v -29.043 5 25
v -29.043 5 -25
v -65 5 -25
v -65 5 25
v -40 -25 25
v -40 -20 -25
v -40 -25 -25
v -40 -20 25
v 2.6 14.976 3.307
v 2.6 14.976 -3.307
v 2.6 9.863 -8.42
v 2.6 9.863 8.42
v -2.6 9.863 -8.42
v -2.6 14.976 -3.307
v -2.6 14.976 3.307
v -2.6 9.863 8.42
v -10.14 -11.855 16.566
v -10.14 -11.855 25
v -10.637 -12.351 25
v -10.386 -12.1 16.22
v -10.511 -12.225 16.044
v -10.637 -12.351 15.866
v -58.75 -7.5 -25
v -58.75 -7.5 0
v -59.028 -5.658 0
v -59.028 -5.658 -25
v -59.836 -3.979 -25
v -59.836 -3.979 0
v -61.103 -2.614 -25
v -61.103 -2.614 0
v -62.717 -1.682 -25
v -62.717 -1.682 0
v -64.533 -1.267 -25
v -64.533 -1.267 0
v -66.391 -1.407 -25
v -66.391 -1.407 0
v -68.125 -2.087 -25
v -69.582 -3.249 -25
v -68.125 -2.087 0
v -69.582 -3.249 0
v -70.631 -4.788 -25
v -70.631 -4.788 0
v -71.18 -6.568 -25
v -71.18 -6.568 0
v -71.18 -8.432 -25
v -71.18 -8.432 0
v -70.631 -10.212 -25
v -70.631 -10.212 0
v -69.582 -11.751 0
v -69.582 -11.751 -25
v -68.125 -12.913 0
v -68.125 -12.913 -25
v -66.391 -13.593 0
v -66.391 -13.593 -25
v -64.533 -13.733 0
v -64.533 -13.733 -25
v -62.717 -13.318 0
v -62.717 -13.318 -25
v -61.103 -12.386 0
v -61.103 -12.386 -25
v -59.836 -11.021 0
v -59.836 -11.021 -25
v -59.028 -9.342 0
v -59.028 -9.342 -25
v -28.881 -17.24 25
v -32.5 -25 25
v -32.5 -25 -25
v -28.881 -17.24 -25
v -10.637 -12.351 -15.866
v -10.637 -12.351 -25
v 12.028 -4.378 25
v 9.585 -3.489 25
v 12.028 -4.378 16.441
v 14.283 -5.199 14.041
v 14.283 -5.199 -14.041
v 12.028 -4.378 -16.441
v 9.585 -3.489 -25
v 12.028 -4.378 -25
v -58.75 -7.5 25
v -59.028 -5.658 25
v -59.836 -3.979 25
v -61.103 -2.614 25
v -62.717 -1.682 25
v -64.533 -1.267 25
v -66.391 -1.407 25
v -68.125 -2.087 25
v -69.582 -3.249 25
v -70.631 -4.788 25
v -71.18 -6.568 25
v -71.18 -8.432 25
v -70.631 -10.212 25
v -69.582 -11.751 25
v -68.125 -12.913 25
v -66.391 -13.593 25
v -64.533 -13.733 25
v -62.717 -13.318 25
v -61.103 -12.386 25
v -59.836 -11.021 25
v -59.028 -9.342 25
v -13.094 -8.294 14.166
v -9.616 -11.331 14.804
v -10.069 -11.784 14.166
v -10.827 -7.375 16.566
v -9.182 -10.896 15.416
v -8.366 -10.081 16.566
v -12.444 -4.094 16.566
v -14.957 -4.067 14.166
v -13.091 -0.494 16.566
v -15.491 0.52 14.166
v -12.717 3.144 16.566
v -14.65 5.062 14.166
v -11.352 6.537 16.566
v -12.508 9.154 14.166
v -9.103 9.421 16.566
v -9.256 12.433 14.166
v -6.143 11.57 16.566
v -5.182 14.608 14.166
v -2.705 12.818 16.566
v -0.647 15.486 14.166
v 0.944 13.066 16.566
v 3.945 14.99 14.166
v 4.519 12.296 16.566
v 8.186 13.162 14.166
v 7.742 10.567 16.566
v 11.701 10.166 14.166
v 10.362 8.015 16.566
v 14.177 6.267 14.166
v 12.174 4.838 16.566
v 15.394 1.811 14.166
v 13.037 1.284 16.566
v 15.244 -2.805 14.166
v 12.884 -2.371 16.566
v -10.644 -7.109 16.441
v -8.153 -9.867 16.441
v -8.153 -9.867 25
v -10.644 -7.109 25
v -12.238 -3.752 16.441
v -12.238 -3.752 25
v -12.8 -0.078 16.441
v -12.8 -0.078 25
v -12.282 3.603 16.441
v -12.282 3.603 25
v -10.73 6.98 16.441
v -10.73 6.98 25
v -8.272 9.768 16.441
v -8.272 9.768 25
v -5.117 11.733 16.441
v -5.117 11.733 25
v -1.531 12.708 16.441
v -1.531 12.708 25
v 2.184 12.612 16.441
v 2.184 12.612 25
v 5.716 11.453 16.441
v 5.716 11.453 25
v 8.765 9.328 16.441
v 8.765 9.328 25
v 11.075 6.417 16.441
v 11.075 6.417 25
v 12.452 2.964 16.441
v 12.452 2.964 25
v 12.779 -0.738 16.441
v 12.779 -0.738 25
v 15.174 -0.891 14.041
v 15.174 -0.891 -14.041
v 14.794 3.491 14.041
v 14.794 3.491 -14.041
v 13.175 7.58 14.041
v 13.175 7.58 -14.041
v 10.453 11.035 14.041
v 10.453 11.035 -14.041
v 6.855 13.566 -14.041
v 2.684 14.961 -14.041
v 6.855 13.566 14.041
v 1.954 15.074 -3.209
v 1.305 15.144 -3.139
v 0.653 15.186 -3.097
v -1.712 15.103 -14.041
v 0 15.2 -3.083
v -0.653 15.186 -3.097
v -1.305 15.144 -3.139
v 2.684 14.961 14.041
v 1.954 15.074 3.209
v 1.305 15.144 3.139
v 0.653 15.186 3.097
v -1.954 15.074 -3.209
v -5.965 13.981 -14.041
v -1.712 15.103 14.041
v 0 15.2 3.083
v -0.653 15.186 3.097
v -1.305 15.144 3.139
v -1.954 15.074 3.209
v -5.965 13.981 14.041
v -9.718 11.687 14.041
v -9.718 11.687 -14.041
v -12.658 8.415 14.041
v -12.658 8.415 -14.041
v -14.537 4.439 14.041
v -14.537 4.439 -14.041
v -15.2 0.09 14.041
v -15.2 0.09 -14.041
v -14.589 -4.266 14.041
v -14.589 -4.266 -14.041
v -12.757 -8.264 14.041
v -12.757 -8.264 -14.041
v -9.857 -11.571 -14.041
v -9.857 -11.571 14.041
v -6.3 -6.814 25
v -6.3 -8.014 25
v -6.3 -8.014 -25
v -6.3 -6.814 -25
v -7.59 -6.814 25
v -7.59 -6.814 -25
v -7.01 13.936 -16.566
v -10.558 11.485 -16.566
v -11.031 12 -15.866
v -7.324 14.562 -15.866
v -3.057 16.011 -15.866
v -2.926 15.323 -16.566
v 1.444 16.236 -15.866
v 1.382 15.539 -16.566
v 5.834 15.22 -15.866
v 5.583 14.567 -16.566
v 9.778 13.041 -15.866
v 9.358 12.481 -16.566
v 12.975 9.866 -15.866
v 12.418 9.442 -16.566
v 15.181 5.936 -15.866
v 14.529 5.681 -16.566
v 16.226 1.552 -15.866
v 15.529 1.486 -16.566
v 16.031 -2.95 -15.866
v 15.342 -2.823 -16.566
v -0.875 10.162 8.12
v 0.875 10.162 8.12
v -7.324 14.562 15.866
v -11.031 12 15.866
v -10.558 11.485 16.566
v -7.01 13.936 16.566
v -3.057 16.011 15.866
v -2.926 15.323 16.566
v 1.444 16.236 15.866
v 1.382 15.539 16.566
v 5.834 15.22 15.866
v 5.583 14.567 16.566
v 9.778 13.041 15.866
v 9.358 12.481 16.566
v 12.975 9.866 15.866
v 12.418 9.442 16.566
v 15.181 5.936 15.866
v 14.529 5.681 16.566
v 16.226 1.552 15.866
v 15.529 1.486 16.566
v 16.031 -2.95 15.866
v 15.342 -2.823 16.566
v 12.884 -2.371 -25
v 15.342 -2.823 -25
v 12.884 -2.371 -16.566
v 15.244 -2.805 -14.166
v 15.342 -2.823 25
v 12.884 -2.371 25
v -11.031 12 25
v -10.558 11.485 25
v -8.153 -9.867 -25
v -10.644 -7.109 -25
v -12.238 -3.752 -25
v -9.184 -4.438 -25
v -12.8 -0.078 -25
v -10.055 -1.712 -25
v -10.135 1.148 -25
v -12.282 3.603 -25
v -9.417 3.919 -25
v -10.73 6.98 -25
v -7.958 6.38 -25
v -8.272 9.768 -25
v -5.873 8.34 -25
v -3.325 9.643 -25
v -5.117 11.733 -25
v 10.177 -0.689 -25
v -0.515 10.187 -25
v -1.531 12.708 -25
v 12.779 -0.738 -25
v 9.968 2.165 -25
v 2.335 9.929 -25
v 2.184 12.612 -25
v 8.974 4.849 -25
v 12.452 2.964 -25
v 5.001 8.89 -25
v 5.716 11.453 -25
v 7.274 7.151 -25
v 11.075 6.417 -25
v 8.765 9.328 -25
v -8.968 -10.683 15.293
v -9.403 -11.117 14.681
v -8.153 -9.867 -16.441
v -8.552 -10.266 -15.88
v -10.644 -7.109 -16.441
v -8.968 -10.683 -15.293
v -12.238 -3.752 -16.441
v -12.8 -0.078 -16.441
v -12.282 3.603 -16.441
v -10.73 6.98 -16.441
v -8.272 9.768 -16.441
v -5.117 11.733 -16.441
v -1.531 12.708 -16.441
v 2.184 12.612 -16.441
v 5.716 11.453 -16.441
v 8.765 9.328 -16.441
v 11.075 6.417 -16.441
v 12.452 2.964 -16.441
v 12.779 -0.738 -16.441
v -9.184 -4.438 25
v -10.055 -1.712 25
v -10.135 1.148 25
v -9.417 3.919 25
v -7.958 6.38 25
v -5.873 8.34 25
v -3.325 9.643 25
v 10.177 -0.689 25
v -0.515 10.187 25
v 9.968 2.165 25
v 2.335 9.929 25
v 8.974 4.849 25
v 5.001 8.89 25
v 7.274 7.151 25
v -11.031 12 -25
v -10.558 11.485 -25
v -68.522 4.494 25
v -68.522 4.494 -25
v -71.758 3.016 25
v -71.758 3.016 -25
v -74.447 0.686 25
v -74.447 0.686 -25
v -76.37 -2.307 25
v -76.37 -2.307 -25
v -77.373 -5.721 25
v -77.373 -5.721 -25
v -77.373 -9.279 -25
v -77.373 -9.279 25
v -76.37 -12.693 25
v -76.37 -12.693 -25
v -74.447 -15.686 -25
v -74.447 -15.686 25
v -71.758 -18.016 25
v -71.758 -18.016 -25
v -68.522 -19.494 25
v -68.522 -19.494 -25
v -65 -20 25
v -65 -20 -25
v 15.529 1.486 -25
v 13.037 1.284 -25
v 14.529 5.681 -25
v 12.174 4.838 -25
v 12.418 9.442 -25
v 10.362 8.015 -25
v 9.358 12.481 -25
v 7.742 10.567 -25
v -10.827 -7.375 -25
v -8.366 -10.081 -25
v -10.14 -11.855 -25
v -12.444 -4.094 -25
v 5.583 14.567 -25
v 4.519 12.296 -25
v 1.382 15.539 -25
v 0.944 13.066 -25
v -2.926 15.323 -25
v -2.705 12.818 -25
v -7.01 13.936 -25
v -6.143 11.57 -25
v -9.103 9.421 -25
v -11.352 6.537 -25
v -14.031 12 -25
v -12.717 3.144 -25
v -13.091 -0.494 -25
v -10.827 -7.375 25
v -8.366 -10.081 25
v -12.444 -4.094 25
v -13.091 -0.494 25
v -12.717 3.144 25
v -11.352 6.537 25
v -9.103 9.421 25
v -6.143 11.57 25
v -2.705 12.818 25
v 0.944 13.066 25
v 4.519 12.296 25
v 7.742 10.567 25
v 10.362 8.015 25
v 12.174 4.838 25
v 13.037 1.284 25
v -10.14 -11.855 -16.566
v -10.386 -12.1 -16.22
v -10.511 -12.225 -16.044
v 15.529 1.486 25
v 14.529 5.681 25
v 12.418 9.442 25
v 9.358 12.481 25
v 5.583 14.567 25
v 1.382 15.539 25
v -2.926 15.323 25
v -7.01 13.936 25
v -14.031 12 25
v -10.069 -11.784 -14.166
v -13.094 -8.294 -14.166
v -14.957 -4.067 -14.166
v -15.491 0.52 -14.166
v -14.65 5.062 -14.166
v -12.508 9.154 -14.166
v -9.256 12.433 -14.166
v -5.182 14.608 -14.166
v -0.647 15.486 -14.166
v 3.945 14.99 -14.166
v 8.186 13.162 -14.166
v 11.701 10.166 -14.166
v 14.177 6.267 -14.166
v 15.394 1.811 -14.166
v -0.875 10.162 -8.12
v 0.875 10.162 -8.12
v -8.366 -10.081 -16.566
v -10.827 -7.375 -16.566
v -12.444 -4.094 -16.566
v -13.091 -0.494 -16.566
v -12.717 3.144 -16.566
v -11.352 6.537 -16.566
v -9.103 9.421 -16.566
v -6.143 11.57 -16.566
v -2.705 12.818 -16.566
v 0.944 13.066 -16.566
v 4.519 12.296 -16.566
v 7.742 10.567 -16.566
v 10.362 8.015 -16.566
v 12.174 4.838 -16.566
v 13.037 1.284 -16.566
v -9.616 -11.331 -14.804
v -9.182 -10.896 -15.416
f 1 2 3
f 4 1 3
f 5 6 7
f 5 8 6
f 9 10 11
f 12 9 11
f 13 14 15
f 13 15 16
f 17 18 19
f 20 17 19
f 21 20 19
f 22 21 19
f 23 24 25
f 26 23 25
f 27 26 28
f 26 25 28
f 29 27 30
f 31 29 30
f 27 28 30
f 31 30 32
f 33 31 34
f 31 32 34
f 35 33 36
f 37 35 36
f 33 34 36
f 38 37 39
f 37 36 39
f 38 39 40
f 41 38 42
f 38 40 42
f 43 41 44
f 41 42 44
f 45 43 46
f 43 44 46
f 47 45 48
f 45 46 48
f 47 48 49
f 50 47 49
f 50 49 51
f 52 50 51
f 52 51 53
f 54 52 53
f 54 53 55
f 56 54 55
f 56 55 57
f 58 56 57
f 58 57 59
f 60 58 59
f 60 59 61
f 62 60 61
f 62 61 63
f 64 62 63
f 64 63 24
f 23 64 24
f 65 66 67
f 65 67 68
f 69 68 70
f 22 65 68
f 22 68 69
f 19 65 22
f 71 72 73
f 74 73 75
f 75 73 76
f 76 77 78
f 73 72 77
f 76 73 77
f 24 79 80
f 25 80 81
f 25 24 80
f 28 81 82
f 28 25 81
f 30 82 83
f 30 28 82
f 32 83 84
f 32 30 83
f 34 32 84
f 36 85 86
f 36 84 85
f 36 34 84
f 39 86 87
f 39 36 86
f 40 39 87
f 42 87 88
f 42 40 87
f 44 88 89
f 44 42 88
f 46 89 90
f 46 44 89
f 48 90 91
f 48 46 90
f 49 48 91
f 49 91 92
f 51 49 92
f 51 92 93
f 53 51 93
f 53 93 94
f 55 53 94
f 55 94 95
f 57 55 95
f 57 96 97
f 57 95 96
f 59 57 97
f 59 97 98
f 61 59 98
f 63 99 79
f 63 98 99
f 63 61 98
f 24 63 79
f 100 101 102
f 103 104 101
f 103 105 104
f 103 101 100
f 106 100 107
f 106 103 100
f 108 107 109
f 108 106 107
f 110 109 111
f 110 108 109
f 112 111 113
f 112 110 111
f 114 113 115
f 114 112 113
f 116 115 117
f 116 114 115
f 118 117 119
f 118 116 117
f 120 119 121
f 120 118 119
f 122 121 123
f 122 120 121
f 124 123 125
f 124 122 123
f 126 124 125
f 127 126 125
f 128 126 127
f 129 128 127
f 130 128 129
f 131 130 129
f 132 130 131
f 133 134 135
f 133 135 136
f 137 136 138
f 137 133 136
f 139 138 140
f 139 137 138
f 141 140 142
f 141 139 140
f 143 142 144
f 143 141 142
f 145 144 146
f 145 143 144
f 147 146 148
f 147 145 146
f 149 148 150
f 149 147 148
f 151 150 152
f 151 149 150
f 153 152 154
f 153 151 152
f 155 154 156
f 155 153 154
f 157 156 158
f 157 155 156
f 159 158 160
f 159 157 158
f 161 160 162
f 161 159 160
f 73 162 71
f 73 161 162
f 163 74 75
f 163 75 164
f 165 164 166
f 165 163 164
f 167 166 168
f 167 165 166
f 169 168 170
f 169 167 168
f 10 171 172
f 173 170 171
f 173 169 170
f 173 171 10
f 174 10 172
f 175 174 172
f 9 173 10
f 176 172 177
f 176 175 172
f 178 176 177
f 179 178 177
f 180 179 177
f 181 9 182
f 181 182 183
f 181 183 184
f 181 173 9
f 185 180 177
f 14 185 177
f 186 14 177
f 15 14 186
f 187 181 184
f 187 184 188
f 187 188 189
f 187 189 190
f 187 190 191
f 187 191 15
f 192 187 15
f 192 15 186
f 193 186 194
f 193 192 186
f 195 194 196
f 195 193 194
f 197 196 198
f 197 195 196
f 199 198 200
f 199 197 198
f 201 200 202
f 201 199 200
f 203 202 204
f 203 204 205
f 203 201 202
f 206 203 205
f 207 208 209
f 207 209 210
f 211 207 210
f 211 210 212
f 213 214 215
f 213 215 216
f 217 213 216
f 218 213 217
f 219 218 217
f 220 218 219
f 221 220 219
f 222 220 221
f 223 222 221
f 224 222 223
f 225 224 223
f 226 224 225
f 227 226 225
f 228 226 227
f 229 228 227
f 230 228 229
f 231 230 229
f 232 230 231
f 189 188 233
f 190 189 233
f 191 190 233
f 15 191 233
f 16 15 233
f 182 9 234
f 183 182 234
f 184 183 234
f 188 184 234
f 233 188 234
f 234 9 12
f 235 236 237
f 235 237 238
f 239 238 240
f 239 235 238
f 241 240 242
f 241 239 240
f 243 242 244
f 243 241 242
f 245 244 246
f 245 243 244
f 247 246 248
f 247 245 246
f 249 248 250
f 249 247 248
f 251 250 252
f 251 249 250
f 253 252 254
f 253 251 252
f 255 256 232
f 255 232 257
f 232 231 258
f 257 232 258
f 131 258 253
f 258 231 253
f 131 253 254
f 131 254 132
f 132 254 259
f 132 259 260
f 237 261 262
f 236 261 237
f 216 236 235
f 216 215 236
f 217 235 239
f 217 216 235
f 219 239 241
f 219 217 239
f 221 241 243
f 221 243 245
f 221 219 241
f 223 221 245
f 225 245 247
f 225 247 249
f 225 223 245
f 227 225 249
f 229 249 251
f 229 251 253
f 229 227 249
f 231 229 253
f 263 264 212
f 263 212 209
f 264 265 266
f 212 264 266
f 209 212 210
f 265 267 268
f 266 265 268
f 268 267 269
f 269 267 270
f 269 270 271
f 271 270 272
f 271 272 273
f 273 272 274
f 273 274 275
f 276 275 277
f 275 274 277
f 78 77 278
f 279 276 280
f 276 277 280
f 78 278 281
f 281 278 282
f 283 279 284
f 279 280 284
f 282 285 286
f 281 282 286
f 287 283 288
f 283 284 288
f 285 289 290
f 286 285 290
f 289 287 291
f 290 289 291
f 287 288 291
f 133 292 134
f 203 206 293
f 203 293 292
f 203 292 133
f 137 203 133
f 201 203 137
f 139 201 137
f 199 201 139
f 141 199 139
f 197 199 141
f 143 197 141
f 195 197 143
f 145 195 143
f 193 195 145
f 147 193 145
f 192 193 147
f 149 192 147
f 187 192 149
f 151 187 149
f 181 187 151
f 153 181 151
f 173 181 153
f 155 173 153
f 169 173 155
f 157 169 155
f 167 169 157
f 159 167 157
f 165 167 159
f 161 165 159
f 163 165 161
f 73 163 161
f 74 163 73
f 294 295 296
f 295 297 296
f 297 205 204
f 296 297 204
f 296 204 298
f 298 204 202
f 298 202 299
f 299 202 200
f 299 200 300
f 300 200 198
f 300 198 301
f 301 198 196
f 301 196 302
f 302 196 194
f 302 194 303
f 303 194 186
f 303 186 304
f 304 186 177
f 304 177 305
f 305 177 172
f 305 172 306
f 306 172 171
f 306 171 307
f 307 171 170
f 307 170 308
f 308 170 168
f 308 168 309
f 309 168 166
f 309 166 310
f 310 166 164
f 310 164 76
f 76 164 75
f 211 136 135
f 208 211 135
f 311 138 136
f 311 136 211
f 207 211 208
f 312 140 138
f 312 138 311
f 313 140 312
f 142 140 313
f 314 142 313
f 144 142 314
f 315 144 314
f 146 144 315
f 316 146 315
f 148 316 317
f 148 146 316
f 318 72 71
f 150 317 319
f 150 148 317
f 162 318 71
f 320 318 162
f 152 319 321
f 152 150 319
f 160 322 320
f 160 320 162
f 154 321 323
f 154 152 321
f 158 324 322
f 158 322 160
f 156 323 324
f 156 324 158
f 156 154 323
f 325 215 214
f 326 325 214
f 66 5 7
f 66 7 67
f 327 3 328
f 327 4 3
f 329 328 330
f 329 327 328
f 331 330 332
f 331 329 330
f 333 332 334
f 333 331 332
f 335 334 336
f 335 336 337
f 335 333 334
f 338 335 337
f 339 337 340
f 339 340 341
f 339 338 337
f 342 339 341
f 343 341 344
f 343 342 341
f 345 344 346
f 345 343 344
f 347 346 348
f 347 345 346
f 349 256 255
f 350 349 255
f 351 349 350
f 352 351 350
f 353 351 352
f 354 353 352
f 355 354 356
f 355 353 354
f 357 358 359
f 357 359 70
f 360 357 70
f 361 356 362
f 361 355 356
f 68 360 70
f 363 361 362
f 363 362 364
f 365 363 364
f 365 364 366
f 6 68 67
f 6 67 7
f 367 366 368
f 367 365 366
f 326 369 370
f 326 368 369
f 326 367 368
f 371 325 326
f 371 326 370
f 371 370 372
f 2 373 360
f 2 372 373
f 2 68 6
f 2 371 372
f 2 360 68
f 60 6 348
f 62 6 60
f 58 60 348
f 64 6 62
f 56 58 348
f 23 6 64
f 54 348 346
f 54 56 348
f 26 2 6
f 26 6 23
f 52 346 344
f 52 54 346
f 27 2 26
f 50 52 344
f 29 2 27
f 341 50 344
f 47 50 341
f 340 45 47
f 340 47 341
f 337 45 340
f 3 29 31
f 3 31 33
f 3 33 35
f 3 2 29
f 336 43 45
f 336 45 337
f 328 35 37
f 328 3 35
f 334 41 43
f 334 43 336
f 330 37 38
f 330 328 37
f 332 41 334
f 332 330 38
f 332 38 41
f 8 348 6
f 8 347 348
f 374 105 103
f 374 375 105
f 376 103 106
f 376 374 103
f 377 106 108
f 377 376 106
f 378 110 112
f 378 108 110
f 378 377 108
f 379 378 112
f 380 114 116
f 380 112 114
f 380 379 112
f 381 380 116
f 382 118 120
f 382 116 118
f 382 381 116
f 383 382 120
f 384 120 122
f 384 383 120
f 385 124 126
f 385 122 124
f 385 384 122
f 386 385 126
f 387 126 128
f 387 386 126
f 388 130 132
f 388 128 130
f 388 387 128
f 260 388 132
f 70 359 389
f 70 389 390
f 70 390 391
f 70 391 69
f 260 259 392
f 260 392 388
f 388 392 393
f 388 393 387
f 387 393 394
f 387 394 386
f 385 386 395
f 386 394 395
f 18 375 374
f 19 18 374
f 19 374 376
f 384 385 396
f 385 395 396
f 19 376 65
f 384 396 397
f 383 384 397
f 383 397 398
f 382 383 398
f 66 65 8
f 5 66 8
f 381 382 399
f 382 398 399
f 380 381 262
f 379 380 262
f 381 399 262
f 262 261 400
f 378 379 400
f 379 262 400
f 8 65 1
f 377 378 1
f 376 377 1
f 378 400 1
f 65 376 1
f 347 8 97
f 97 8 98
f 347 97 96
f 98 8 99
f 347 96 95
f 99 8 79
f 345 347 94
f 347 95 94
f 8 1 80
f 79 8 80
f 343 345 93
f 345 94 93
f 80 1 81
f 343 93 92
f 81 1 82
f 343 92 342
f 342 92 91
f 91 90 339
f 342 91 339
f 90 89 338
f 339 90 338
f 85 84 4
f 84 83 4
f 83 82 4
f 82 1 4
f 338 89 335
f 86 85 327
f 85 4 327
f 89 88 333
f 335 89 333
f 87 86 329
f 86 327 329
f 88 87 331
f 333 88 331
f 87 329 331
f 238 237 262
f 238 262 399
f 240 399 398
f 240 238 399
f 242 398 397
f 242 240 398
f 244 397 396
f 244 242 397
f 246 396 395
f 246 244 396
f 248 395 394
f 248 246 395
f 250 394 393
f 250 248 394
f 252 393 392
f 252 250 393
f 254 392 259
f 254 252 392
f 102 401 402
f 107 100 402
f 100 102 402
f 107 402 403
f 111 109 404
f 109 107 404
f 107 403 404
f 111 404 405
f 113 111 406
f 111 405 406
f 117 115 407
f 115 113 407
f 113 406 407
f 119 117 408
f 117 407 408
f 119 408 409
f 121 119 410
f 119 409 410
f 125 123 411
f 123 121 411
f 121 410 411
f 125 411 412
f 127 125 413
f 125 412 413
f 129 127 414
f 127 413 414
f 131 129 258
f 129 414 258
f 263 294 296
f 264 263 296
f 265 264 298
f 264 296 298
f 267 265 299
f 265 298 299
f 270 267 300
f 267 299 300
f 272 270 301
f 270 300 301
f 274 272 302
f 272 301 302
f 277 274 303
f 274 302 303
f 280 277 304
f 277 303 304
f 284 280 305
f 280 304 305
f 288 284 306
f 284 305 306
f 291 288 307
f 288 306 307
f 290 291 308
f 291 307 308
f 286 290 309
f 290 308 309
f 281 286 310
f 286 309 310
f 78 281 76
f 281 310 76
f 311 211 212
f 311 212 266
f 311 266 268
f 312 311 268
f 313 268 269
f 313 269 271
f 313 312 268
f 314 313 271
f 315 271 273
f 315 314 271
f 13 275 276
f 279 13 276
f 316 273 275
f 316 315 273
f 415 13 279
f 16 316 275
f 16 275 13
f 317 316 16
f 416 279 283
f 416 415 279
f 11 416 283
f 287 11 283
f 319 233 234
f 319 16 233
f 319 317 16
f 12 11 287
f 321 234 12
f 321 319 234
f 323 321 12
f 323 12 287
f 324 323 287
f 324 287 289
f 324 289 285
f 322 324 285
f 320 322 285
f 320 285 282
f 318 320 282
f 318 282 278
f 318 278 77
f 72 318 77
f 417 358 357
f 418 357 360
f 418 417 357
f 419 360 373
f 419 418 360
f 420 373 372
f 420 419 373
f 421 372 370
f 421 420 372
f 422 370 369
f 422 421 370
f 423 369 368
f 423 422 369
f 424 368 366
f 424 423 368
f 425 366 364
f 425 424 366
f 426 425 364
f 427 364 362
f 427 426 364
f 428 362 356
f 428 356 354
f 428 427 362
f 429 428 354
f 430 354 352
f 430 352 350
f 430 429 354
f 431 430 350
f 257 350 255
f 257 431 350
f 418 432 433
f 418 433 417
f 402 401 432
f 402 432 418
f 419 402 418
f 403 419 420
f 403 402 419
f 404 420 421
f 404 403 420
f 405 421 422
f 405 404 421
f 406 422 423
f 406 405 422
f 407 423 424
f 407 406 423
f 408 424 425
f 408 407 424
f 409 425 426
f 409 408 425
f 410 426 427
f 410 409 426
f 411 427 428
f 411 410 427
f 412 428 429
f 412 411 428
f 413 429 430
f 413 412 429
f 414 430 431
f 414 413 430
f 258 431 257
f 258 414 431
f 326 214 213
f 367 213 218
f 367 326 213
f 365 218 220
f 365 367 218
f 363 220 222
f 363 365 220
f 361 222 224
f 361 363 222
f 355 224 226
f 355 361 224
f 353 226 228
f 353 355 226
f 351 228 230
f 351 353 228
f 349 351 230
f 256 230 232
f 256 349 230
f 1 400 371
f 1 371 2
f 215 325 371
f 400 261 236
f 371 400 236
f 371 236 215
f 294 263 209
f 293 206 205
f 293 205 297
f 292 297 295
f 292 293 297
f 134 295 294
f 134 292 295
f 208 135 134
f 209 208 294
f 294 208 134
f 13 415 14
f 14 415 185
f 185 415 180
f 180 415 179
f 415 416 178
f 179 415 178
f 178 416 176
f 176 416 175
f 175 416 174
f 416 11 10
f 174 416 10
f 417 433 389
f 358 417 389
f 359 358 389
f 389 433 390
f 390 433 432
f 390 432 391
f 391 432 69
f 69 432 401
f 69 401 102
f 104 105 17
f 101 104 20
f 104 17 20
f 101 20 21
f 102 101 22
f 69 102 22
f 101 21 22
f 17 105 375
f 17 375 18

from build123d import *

# Parameters (mm, degrees)
BOSS_EXTRUDE1_DEPTH     = 25
CUT_EXTRUDE1_DEPTH      = 2.6
CUT_EXTRUDE2_DEPTH      = 26
CUT_EXTRUDE2_DEPTH_BACK = 26
BOSS_EXTRUDE2_DEPTH     = 25
BOSS_EXTRUDE3_START     = -9.134315
BOSS_EXTRUDE3_DEPTH     = 9.134315
SKETCH15_R              = 6.25
CUT_EXTRUDE3_DEPTH      = 26
CUT_EXTRUDE3_DEPTH_BACK = 26
CUT_EXTRUDE4_DEPTH      = 26
CUT_EXTRUDE4_DEPTH_BACK = 26


with BuildPart() as part:
    # Sketch3 → Boss-Extrude1 (new body, symmetric)
    with BuildSketch(Plane.XY):
        with BuildLine():
            Line((6.3, -8.014378278), (9.856597623, -11.570975901))
            ThreePointArc((9.856597623, -11.570975901), (0, 15.2), (-9.856597623, -11.570975901))
            Line((-9.856597623, -11.570975901), (-6.3, -8.014378278))
            Line((-6.3, -8.014378278), (-6.3, -6.814378278))
            Line((-6.3, -6.814378278), (-7.589746286, -6.814378278))
            ThreePointArc((-7.589746286, -6.814378278), (0, 10.2), (7.589746286, -6.814378278))
            Line((7.589746286, -6.814378278), (6.3, -6.814378278))
            Line((6.3, -6.814378278), (6.3, -8.014378278))
        make_face()
    extrude(amount=BOSS_EXTRUDE1_DEPTH, both=True)

    # Sketch4 → Cut-Extrude1 (cut, symmetric)
    with BuildSketch(Plane(origin=(0, 0, 0), x_dir=(0, 0, -1), z_dir=(1, 0, 0))):
        Polygon((-3.082842712, 15.2), (-9.482842712, 8.8), (9.482842712, 8.8), (3.082842712, 15.2), align=None)
    extrude(amount=CUT_EXTRUDE1_DEPTH, both=True, mode=Mode.SUBTRACT)

    # Sketch5 → Cut-Revolve1 (revolve, cut)
    with BuildSketch(Plane(origin=(0, 0, 0), x_dir=(0, 0, -1), z_dir=(1, 0, 0))):
        Polygon((25, 15.2), (25, 12.8), (16.441421356, 12.8), (14.041421356, 15.2), align=None)
    cut_revolve1 = revolve(axis=Axis((0, 0, 27.223610458), (0, 0, -1)), mode=Mode.SUBTRACT)

    # Mirror1: Cut-Revolve1 across plane
    add(cut_revolve1.mirror(Plane.XY), mode=Mode.SUBTRACT)

    # Sketch16 → Cut-Extrude4 (cut, two sides)
    with BuildSketch(Plane.XY) as cut_extrude4_sk:
        with BuildLine():
            Line((0, 0), (14.283327836, -5.198706179))
            ThreePointArc((14.283327836, -5.198706179), (8.718361833, -12.451111073), (0, -15.2))
            Line((0, -15.2), (0, 0))
        make_face()
    extrude(amount=CUT_EXTRUDE4_DEPTH, mode=Mode.SUBTRACT)
    extrude(cut_extrude4_sk.sketch, amount=-CUT_EXTRUDE4_DEPTH_BACK, mode=Mode.SUBTRACT)


with BuildPart() as body_2:
    # Sketch7 → Revolve1 (revolve)
    with BuildSketch(Plane(origin=(0, 0, 0), x_dir=(0, 0, -1), z_dir=(1, 0, 0))):
        Polygon((25, 13.1), (16.565685425, 13.1), (14.165685425, 15.5), (3.082842712, 15.5), (-3.082842712, 15.5), (-14.165685425, 15.5), (-16.565685425, 13.1), (-25, 13.1), (-25, 15.6), (-16.565685425, 15.6), (-15.865685425, 16.3), (15.865685425, 16.3), (16.565685425, 15.6), (25, 15.6), align=None)
    revolve(axis=Axis((0, 0, 29.952528939), (0, 0, -1)))

    # Sketch10 → Cut-Extrude2 (cut, two sides)
    with BuildSketch(Plane.XY) as cut_extrude2_sk:
        with BuildLine():
            Line((-6.3, -8.014378278), (-9.856597623, -11.570975901))
            Line((-9.856597623, -11.570975901), (-28.285621722, -30))
            Line((-28.285621722, -30), (0, -30))
            ThreePointArc((0, -30), (19.198137256, -23.052798657), (29.504719516, -5.428768394))
            Line((29.504719516, -5.428768394), (0, 0))
            Line((0, 0), (-6.3, -8.014378278))
        make_face()
    extrude(amount=CUT_EXTRUDE2_DEPTH, mode=Mode.SUBTRACT)
    extrude(cut_extrude2_sk.sketch, amount=-CUT_EXTRUDE2_DEPTH_BACK, mode=Mode.SUBTRACT)

    # Sketch12 → Boss-Extrude2 (add, symmetric)
    with BuildSketch(Plane.XY):
        with BuildLine():
            Line((-40, -20), (-40, -25))
            Line((-40, -25), (-32.5, -25))
            Line((-32.5, -25), (-28.881329228, -17.239735487))
            Line((-28.881329228, -17.239735487), (-10.636732158, -12.351110436))
            ThreePointArc((-10.636732158, -12.351110436), (-16.297860463, -0.264091534), (-11.031319051, 12))
            Line((-11.031319051, 12), (-14.031319051, 12))
            Line((-14.031319051, 12), (-29.042867494, 5))
            Line((-29.042867494, 5), (-65, 5))
            ThreePointArc((-65, 5), (-77.5, -7.5), (-65, -20))
            Line((-65, -20), (-40, -20))
        make_face()
    extrude(amount=BOSS_EXTRUDE2_DEPTH, both=True)

    # Sketch13 → Boss-Extrude3 (add)
    with BuildSketch(Plane(origin=(0, 0, -25), x_dir=(-1, 0, 0), z_dir=(0, 0, -1)).offset(BOSS_EXTRUDE3_START)):
        with BuildLine():
            Line((11.031319051, 12), (10.557581423, 11.484662577))
            ThreePointArc((10.557581423, 11.484662577), (15.597507546, -0.278851856), (10.140320888, -11.854699165))
            Line((10.140320888, -11.854699165), (10.636732158, -12.351110436))
            ThreePointArc((10.636732158, -12.351110436), (16.297860463, -0.264091534), (11.031319051, 12))
        make_face()
    boss_extrude3 = extrude(amount=BOSS_EXTRUDE3_DEPTH)

    # Mirror2: Boss-Extrude3 across plane
    add(boss_extrude3.mirror(Plane.XY))

    # Sketch15 → Cut-Extrude3 (cut, two sides)
    with BuildSketch(Plane.XY) as cut_extrude3_sk:
        with Locations((-65, -7.5)):
            Circle(SKETCH15_R)
    extrude(amount=CUT_EXTRUDE3_DEPTH, mode=Mode.SUBTRACT)
    extrude(cut_extrude3_sk.sketch, amount=-CUT_EXTRUDE3_DEPTH_BACK, mode=Mode.SUBTRACT)


solid = Compound([part.part, body_2.part])
